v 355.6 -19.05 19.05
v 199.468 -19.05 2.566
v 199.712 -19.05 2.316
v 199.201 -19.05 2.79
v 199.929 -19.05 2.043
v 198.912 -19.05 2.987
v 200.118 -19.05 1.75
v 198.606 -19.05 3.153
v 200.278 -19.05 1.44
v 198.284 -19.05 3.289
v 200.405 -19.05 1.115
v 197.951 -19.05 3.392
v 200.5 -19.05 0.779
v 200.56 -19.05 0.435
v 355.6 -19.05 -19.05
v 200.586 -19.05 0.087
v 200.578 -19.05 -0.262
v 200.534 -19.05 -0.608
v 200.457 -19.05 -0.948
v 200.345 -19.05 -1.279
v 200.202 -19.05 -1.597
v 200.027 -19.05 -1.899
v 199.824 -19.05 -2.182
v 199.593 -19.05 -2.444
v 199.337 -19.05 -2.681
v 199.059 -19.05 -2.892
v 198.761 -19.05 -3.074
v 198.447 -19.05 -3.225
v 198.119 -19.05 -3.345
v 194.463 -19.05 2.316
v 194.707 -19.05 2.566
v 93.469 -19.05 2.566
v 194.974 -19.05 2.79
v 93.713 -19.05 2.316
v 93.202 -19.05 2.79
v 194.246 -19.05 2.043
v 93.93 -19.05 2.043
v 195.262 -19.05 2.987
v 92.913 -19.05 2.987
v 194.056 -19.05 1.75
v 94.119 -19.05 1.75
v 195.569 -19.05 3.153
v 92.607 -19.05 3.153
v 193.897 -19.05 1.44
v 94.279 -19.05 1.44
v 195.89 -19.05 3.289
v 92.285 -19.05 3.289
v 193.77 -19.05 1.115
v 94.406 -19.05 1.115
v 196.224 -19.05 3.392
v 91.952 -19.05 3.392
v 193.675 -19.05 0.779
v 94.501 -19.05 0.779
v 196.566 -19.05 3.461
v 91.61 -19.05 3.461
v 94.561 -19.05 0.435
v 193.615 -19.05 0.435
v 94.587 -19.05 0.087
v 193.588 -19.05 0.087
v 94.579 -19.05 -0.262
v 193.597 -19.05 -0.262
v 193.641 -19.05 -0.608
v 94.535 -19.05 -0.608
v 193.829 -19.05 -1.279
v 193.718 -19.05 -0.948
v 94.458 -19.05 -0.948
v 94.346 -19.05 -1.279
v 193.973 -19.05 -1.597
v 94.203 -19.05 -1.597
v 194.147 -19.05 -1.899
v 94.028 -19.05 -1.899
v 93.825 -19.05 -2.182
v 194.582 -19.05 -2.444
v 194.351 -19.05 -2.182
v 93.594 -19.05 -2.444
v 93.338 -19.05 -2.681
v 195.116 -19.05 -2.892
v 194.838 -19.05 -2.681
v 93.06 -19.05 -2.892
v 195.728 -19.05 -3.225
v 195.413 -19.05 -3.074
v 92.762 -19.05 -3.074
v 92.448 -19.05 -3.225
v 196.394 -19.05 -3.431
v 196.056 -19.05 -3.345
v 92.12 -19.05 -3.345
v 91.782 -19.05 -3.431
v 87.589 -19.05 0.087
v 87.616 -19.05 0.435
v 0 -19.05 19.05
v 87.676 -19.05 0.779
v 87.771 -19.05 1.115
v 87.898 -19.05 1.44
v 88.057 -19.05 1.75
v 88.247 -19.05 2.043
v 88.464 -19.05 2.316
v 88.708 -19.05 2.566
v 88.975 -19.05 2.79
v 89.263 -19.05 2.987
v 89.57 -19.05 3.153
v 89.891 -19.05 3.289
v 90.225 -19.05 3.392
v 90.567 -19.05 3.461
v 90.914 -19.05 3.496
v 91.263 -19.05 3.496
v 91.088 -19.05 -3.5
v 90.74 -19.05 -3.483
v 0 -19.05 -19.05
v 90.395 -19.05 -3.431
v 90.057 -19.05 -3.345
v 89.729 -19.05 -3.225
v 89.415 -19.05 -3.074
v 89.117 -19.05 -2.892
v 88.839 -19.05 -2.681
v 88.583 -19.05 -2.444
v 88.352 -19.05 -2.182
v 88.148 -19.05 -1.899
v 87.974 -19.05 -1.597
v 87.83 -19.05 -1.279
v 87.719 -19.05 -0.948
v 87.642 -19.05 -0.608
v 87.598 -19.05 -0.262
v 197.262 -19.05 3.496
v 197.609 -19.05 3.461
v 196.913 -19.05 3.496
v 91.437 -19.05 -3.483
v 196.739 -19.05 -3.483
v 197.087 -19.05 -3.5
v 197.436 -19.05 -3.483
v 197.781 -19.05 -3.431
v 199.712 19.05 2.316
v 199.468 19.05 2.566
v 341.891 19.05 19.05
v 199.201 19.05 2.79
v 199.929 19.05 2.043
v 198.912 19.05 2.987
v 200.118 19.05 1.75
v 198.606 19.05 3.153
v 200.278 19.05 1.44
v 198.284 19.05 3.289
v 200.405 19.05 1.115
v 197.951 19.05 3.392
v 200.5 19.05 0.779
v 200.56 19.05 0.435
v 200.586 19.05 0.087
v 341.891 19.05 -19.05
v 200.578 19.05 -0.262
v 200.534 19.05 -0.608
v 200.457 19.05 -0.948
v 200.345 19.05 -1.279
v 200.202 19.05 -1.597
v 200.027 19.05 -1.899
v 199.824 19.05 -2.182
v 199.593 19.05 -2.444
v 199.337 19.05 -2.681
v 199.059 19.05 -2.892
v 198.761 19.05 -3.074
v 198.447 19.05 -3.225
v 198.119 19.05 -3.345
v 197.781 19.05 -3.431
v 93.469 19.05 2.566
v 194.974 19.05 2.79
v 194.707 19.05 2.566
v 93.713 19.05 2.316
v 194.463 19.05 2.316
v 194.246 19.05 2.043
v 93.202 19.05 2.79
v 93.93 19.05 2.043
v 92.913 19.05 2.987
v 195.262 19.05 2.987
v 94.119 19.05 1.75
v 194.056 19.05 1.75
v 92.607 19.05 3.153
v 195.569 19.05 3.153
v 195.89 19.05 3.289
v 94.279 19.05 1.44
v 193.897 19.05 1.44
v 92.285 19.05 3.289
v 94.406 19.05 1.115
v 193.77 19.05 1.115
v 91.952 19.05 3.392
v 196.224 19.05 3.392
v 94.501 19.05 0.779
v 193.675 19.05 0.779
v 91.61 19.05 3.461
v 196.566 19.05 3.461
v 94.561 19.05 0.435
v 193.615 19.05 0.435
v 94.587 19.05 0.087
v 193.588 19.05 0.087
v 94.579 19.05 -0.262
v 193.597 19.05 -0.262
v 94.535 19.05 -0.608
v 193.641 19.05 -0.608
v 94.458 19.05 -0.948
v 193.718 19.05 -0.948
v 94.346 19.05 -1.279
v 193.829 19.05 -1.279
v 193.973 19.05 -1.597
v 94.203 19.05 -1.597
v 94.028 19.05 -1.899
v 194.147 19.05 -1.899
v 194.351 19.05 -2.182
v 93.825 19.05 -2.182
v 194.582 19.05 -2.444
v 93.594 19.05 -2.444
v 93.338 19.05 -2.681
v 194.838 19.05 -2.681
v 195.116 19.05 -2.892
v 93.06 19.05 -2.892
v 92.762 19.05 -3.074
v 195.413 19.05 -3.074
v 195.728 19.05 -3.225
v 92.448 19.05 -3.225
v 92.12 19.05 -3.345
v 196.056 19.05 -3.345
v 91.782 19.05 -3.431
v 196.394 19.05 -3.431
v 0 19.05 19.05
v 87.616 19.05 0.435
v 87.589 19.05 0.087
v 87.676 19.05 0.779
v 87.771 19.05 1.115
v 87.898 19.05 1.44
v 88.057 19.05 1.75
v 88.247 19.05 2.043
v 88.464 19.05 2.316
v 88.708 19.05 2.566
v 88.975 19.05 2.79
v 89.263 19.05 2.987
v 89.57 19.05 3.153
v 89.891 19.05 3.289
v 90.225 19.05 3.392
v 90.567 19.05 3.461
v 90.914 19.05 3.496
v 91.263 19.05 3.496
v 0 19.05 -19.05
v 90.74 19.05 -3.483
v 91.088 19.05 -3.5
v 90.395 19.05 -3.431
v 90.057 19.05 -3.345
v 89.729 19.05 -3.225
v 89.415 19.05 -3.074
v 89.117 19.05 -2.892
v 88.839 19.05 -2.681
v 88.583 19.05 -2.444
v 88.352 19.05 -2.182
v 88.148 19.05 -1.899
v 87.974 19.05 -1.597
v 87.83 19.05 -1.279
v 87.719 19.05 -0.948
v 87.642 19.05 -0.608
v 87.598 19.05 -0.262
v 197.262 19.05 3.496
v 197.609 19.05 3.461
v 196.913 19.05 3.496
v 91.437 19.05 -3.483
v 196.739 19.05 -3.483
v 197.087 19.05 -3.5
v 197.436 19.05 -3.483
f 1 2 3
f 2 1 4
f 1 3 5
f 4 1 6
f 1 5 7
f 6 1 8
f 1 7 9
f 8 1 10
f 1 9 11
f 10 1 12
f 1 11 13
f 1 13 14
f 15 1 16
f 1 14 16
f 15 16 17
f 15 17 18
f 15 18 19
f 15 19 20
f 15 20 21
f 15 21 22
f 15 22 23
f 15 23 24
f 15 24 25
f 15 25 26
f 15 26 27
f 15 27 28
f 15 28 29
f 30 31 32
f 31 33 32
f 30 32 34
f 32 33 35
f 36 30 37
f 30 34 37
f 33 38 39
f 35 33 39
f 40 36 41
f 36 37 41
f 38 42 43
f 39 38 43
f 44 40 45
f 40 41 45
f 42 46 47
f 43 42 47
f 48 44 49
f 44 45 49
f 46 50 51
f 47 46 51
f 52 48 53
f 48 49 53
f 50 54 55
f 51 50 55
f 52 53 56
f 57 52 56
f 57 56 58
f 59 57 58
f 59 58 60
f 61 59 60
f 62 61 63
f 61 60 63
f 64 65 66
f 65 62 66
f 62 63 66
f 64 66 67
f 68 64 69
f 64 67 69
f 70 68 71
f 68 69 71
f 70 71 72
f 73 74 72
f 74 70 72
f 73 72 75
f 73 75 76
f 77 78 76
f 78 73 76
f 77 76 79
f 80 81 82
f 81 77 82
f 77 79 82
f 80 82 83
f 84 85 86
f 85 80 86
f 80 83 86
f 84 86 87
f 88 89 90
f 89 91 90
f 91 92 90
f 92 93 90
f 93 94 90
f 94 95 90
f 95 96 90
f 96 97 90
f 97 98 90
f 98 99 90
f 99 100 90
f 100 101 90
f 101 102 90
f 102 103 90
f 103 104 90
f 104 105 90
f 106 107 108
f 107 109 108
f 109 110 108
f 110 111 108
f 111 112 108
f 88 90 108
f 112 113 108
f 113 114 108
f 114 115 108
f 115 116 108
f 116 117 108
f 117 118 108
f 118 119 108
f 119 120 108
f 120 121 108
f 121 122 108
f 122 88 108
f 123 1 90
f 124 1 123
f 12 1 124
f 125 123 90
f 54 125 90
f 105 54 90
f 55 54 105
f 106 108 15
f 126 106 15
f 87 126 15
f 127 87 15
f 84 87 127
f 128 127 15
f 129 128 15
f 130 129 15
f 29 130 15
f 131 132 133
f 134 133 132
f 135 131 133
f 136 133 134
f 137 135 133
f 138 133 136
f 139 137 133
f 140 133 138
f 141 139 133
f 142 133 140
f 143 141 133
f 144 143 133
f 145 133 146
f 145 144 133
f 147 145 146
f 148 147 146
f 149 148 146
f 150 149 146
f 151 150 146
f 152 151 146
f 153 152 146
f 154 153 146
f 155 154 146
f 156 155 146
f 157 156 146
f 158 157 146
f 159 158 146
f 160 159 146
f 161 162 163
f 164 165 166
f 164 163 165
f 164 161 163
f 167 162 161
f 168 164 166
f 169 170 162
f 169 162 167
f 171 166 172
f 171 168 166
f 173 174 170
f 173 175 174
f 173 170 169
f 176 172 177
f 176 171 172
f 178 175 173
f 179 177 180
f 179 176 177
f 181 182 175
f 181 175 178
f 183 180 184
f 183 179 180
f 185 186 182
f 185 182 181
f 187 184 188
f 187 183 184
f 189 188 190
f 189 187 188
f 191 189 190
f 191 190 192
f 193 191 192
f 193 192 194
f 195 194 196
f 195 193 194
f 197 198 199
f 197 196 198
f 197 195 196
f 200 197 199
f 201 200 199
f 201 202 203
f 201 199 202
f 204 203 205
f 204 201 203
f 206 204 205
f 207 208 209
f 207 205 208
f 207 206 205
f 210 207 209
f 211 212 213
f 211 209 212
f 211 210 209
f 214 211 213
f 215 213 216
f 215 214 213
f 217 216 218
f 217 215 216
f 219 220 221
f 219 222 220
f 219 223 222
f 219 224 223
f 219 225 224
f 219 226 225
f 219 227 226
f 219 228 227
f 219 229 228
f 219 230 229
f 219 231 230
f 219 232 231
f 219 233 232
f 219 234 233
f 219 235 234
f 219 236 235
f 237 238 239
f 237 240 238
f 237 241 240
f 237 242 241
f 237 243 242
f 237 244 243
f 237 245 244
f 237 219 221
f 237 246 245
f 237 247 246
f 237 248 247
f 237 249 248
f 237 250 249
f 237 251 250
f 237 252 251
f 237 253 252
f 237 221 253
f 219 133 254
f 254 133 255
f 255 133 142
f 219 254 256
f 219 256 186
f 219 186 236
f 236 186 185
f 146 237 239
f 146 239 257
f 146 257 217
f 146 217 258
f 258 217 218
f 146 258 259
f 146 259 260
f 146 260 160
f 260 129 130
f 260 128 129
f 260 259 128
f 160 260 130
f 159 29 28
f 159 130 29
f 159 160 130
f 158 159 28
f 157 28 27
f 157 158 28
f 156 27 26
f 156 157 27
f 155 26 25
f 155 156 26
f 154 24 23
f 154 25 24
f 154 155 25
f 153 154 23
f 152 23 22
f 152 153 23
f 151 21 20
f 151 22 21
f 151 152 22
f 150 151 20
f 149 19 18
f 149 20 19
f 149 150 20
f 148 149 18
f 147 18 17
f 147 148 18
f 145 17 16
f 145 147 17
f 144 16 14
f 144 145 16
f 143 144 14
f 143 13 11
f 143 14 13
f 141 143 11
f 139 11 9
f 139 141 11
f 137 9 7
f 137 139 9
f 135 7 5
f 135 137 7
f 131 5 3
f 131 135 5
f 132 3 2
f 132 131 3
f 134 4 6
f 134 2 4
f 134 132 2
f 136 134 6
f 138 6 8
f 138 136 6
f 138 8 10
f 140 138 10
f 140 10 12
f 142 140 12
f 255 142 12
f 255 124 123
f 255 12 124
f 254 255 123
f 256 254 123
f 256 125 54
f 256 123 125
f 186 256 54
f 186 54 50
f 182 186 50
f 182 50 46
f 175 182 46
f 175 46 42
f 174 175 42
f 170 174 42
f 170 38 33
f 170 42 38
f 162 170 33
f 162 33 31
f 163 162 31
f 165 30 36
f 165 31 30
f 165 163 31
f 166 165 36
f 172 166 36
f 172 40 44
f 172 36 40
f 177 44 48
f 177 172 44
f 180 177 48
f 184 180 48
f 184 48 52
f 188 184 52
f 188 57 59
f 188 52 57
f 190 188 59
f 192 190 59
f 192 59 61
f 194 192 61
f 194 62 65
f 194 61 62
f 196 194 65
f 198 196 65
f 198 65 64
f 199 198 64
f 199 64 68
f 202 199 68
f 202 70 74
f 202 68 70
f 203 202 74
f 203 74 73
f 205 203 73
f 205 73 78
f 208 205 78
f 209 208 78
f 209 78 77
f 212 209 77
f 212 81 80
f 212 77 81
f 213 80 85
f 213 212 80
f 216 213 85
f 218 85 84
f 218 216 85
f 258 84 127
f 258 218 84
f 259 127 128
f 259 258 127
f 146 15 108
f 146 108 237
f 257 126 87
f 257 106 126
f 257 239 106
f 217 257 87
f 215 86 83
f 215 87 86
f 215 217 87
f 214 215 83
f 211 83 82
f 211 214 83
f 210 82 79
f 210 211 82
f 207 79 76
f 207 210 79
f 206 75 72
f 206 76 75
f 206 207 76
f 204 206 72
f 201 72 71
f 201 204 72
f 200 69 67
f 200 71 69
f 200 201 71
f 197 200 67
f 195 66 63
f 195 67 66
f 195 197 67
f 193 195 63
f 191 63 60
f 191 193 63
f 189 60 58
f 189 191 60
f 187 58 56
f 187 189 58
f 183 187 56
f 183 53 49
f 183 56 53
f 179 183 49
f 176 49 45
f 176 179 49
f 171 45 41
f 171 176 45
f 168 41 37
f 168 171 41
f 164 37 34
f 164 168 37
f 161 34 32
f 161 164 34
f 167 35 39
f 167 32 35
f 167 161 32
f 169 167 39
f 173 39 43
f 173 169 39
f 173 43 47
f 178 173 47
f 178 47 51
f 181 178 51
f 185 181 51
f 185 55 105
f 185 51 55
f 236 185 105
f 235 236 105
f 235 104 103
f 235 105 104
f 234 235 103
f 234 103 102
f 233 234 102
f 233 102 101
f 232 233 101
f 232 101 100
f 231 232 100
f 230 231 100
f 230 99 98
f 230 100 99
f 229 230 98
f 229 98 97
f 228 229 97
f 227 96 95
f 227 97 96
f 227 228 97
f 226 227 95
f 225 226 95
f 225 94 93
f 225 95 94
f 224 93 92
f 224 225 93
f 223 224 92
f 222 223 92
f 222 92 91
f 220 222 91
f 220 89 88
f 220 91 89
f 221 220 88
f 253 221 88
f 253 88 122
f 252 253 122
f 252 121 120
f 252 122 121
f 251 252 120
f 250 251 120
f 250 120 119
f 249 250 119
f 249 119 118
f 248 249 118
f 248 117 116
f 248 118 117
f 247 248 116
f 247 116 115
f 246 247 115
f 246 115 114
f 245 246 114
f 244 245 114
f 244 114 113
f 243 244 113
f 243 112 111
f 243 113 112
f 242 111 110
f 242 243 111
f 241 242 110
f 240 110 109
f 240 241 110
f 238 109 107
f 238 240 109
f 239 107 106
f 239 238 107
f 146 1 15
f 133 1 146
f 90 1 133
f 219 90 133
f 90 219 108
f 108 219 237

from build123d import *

# Parameters (mm, degrees)
SKETCH1_W               = 38.1
SKETCH1_H               = 38.1
BOSS_EXTRUDE1_DEPTH     = 355.6
CUT_EXTRUDE1_DEPTH      = 359.142251766
CUT_EXTRUDE2_DEPTH      = 359.142251766
CUT_EXTRUDE2_DEPTH_BACK = 359.142251766
SKETCH3_R               = 3.5


with BuildPart() as part:
    # Sketch1 → Boss-Extrude1 (new body)
    with BuildSketch(Plane(origin=(0, 0, 0), x_dir=(0, 0, -1), z_dir=(1, 0, 0))):
        Rectangle(SKETCH1_W, SKETCH1_H)
    extrude(amount=BOSS_EXTRUDE1_DEPTH)

    # Sketch2 → Cut-Extrude1 (cut, through all)
    with BuildSketch(Plane.XY.offset(19.05)):
        Polygon((355.6, -19.05), (341.890667107, 19.05), (355.6, 19.05), align=None)
    extrude(amount=-CUT_EXTRUDE1_DEPTH, mode=Mode.SUBTRACT)

    # Sketch3 → Cut-Extrude2 (cut, two sides: drawn at the far end of the back side and taken through both)
    with BuildSketch(Plane(origin=(0, -19.05, 0), x_dir=(-1, 0, 0), z_dir=(0, -1, 0)).offset(-CUT_EXTRUDE2_DEPTH_BACK)):
        with Locations(Location((-91.088392372, 0, 0), (0, 0, 90))):
            Circle(SKETCH3_R)
        with Locations(Location((-197.087368962, 0, 0), (0, 0, 90))):
            Circle(SKETCH3_R)
    extrude(amount=CUT_EXTRUDE2_DEPTH + CUT_EXTRUDE2_DEPTH_BACK, mode=Mode.SUBTRACT)


solid = part.part
